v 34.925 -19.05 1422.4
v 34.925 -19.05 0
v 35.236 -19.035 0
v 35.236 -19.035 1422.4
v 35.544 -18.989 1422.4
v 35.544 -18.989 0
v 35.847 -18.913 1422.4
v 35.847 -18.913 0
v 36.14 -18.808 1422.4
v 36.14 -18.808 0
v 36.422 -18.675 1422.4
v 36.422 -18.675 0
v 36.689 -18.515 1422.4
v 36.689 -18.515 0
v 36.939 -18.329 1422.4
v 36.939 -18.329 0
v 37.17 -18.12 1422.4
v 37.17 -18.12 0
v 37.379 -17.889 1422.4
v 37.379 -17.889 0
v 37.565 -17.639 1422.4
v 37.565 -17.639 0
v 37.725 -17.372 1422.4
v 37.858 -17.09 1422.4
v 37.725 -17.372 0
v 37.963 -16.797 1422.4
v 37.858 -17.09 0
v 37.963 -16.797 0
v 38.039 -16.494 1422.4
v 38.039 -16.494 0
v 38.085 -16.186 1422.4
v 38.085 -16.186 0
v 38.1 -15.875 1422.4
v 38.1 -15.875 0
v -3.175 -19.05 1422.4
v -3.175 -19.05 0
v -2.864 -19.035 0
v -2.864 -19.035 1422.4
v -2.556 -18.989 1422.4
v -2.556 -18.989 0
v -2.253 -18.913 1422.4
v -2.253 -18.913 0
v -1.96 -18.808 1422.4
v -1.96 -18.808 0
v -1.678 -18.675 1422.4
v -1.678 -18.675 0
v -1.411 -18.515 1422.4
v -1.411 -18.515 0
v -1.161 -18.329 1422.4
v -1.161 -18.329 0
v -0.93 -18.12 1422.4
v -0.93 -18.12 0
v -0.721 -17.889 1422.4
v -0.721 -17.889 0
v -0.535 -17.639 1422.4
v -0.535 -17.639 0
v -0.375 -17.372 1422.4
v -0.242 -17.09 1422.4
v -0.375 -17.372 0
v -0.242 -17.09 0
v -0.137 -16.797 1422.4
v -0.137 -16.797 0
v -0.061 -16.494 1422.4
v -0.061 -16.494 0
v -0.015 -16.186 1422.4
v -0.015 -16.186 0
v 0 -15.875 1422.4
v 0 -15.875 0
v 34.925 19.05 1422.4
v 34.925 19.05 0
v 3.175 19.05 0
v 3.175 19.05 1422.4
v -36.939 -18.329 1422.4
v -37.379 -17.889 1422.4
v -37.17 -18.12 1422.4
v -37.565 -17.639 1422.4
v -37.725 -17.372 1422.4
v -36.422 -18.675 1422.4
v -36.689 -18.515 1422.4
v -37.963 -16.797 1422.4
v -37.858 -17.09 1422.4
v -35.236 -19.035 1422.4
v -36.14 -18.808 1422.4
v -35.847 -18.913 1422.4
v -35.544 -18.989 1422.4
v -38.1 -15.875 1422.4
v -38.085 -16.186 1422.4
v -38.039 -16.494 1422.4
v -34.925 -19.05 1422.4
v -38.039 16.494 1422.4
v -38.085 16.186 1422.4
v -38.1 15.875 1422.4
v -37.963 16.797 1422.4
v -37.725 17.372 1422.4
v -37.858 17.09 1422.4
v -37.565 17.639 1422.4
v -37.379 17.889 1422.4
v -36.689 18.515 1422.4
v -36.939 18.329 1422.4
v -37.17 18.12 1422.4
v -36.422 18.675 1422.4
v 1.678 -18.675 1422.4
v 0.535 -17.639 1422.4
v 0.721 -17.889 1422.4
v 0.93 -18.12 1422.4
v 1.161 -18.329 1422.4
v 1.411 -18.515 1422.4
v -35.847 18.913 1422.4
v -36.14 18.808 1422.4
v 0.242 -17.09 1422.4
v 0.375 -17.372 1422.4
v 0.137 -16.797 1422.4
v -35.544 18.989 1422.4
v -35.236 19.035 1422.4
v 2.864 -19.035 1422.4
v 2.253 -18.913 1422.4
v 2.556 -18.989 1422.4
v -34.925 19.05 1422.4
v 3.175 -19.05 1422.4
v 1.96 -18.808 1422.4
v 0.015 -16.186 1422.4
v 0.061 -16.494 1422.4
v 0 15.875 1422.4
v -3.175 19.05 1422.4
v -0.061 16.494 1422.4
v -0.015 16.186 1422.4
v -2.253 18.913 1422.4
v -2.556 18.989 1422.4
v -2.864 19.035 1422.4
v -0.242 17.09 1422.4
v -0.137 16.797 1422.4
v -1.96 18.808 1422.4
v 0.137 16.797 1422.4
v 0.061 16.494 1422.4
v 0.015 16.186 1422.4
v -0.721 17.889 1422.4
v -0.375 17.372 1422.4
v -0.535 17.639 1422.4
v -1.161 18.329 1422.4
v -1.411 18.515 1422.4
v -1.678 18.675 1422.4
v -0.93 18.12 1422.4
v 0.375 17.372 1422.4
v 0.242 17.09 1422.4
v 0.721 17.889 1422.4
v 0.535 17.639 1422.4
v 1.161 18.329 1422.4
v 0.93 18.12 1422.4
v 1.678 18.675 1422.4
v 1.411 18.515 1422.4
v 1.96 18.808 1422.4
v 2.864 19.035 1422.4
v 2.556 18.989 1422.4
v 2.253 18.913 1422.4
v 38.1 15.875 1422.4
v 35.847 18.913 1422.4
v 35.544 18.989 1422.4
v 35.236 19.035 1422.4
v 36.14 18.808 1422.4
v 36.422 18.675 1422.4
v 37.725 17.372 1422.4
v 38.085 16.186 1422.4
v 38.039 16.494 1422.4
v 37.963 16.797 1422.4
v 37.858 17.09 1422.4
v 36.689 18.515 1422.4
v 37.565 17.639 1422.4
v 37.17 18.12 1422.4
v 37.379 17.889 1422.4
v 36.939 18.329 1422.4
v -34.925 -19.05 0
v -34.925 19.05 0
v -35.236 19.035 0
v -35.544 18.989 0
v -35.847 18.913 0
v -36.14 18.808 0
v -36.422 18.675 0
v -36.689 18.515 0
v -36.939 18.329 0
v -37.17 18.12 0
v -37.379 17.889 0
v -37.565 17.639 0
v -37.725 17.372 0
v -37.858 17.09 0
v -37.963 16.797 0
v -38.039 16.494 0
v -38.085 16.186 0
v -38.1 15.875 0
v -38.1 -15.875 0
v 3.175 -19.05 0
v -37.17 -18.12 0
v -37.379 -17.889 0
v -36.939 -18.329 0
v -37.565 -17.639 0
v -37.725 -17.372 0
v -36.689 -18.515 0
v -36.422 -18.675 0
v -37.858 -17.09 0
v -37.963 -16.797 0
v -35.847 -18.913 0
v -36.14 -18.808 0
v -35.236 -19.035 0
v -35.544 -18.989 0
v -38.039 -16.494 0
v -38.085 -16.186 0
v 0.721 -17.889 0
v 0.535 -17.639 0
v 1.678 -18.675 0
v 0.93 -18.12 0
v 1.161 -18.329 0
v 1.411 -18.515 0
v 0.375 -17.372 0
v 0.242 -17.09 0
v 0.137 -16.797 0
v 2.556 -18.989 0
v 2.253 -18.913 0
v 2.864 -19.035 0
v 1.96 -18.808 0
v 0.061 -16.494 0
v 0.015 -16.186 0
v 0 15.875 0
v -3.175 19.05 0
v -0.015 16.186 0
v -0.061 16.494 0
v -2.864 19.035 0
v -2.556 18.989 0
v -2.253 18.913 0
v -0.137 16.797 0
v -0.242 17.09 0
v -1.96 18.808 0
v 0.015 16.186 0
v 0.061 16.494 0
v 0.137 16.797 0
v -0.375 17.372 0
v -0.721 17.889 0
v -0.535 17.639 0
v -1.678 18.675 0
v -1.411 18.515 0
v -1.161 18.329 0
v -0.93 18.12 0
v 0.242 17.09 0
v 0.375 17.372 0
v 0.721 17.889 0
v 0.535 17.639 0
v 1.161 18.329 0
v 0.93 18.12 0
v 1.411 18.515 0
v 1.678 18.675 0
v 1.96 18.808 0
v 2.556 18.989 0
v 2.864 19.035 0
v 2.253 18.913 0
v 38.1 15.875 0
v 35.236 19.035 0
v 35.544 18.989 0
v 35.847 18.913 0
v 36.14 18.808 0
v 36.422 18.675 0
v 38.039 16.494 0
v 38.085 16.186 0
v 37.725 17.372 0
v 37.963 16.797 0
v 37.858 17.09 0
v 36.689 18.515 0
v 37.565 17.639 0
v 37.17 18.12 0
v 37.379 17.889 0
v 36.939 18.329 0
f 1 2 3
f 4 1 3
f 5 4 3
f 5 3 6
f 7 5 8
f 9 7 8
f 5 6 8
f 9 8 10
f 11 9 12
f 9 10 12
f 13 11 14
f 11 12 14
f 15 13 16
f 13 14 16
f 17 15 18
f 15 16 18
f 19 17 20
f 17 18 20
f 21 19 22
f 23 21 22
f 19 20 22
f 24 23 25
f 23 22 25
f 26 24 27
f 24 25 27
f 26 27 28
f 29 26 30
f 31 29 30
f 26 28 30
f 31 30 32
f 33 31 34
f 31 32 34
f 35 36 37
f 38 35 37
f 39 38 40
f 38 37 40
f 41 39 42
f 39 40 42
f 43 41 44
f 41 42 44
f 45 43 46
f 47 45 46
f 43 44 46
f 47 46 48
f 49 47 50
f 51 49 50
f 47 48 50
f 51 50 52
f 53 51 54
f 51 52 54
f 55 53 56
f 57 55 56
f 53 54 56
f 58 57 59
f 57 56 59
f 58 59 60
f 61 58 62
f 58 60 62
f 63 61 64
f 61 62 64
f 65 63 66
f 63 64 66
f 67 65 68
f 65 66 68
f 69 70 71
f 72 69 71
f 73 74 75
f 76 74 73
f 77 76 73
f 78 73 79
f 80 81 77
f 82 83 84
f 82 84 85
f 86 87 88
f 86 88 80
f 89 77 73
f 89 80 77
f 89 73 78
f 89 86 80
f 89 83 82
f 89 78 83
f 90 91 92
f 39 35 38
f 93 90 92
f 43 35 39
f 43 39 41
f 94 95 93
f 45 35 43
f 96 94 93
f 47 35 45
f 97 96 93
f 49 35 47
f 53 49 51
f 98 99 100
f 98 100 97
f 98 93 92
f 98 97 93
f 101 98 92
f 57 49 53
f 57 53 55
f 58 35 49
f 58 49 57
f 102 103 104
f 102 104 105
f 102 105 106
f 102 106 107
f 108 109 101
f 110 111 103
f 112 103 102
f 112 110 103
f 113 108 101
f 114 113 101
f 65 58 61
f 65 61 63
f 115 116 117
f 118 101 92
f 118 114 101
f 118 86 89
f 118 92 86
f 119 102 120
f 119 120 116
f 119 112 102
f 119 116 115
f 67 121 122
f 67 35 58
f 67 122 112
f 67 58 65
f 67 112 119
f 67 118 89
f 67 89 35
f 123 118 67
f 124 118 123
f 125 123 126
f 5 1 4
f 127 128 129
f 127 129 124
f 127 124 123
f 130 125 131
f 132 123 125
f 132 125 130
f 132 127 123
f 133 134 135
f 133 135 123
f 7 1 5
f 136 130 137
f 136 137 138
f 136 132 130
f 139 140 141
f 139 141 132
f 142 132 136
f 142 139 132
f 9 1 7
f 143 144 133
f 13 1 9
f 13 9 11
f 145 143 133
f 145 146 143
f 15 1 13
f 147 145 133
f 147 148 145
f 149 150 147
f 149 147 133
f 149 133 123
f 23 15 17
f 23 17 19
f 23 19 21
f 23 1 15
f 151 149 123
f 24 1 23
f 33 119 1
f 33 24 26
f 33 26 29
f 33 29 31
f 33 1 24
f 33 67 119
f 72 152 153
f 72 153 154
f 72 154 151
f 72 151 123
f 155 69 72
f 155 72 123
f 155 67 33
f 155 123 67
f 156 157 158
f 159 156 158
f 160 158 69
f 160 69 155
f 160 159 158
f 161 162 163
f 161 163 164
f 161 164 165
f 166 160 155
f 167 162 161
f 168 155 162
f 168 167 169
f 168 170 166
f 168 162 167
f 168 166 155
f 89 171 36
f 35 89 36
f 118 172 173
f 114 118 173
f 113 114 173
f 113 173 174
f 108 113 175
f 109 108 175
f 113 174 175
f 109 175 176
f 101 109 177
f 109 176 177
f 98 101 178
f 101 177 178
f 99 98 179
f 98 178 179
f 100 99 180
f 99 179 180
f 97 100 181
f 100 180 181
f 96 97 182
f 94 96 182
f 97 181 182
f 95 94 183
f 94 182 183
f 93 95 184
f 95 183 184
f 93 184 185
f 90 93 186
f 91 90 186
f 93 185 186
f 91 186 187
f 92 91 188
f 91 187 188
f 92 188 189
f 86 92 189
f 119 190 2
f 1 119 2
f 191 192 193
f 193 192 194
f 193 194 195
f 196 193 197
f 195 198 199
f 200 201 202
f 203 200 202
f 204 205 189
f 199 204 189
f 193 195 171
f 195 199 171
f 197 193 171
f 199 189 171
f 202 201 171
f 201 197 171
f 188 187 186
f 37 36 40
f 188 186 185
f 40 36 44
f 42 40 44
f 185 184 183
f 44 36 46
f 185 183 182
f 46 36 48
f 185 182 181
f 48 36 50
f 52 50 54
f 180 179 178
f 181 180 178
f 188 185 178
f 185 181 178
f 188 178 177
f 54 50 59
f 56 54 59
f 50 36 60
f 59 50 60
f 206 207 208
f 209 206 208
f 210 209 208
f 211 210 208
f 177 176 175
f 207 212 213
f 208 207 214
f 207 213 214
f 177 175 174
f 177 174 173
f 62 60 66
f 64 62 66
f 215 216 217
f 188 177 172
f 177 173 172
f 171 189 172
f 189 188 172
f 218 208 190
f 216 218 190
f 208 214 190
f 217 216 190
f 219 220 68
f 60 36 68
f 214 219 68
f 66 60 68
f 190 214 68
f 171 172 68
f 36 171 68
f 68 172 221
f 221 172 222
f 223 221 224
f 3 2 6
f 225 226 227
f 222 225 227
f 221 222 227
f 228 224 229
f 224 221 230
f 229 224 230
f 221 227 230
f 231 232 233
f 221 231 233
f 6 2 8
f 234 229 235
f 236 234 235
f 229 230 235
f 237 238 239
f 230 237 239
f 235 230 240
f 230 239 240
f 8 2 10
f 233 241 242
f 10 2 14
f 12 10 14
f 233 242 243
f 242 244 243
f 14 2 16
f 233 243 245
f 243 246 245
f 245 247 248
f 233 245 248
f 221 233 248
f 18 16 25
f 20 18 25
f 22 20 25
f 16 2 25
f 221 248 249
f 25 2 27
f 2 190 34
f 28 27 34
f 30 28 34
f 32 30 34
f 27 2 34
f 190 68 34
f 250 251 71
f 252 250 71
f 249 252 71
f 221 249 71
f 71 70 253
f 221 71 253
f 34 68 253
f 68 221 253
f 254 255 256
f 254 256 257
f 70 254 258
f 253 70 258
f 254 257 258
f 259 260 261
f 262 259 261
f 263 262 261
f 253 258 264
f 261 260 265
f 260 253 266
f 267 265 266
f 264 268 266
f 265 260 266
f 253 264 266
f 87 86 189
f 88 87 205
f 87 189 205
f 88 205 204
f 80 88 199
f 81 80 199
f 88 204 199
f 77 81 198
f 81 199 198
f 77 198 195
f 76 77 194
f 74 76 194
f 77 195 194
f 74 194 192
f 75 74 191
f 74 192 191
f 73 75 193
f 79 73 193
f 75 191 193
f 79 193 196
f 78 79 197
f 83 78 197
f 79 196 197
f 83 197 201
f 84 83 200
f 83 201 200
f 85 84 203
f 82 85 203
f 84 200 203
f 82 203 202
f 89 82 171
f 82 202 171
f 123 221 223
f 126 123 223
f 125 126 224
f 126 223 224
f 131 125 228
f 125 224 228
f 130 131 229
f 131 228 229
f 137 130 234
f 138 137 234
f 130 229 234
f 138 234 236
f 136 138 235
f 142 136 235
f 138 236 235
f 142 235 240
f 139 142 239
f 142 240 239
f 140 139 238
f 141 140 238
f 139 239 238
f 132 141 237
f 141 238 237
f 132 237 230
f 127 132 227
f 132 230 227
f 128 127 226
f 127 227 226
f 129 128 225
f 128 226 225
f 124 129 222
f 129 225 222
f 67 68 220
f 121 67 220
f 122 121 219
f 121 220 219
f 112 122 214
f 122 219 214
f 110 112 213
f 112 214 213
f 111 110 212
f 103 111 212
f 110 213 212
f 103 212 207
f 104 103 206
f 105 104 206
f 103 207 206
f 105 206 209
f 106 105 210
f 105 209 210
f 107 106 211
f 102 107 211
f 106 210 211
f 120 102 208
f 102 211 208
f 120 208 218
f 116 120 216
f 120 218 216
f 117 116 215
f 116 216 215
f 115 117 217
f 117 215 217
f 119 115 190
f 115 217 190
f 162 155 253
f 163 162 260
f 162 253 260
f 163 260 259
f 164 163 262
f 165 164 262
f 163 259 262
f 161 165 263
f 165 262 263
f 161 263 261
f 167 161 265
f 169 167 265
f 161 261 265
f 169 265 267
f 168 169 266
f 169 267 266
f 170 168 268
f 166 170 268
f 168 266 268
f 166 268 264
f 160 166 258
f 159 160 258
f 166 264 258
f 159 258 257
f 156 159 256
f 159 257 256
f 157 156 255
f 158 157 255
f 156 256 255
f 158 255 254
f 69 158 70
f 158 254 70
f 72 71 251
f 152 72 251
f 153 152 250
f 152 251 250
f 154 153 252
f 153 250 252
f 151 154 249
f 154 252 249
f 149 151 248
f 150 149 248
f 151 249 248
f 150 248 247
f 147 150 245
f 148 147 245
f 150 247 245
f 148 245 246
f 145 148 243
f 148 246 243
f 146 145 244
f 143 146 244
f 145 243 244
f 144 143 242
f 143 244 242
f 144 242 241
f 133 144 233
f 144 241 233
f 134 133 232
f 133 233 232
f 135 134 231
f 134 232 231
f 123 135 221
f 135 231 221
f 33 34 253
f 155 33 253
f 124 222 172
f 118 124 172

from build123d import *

# Parameters (mm, degrees)
F1_DEPTH = 1422.4


with BuildPart() as f1:
    # F0 (on Top) → F1 (new body)
    with BuildSketch(Plane.XY):
        with BuildLine():
            ThreePointArc((38.1, 15.875), (37.170064, 18.120064), (34.925, 19.05))
            Line((34.925, 19.05), (3.175, 19.05))
            ThreePointArc((3.175, 19.05), (0.929936, 18.120064), (0, 15.875))
            Line((0, 15.875), (0, -15.875))
            ThreePointArc((0, -15.875), (0.929936, -18.120064), (3.175, -19.05))
            Line((3.175, -19.05), (34.925, -19.05))
            ThreePointArc((34.925, -19.05), (37.170064, -18.120064), (38.1, -15.875))
            Line((38.1, -15.875), (38.1, 15.875))
        make_face()
        with BuildLine():
            Line((0, -15.875), (0, 15.875))
            ThreePointArc((0, 15.875), (-0.929936, 18.120064), (-3.175, 19.05))
            Line((-3.175, 19.05), (-34.925, 19.05))
            ThreePointArc((-34.925, 19.05), (-37.170064, 18.120064), (-38.1, 15.875))
            Line((-38.1, 15.875), (-38.1, -15.875))
            ThreePointArc((-38.1, -15.875), (-37.170064, -18.120064), (-34.925, -19.05))
            Line((-34.925, -19.05), (-3.175, -19.05))
            ThreePointArc((-3.175, -19.05), (-0.929936, -18.120064), (0, -15.875))
        make_face()
    extrude(amount=F1_DEPTH)


solid = f1.part
